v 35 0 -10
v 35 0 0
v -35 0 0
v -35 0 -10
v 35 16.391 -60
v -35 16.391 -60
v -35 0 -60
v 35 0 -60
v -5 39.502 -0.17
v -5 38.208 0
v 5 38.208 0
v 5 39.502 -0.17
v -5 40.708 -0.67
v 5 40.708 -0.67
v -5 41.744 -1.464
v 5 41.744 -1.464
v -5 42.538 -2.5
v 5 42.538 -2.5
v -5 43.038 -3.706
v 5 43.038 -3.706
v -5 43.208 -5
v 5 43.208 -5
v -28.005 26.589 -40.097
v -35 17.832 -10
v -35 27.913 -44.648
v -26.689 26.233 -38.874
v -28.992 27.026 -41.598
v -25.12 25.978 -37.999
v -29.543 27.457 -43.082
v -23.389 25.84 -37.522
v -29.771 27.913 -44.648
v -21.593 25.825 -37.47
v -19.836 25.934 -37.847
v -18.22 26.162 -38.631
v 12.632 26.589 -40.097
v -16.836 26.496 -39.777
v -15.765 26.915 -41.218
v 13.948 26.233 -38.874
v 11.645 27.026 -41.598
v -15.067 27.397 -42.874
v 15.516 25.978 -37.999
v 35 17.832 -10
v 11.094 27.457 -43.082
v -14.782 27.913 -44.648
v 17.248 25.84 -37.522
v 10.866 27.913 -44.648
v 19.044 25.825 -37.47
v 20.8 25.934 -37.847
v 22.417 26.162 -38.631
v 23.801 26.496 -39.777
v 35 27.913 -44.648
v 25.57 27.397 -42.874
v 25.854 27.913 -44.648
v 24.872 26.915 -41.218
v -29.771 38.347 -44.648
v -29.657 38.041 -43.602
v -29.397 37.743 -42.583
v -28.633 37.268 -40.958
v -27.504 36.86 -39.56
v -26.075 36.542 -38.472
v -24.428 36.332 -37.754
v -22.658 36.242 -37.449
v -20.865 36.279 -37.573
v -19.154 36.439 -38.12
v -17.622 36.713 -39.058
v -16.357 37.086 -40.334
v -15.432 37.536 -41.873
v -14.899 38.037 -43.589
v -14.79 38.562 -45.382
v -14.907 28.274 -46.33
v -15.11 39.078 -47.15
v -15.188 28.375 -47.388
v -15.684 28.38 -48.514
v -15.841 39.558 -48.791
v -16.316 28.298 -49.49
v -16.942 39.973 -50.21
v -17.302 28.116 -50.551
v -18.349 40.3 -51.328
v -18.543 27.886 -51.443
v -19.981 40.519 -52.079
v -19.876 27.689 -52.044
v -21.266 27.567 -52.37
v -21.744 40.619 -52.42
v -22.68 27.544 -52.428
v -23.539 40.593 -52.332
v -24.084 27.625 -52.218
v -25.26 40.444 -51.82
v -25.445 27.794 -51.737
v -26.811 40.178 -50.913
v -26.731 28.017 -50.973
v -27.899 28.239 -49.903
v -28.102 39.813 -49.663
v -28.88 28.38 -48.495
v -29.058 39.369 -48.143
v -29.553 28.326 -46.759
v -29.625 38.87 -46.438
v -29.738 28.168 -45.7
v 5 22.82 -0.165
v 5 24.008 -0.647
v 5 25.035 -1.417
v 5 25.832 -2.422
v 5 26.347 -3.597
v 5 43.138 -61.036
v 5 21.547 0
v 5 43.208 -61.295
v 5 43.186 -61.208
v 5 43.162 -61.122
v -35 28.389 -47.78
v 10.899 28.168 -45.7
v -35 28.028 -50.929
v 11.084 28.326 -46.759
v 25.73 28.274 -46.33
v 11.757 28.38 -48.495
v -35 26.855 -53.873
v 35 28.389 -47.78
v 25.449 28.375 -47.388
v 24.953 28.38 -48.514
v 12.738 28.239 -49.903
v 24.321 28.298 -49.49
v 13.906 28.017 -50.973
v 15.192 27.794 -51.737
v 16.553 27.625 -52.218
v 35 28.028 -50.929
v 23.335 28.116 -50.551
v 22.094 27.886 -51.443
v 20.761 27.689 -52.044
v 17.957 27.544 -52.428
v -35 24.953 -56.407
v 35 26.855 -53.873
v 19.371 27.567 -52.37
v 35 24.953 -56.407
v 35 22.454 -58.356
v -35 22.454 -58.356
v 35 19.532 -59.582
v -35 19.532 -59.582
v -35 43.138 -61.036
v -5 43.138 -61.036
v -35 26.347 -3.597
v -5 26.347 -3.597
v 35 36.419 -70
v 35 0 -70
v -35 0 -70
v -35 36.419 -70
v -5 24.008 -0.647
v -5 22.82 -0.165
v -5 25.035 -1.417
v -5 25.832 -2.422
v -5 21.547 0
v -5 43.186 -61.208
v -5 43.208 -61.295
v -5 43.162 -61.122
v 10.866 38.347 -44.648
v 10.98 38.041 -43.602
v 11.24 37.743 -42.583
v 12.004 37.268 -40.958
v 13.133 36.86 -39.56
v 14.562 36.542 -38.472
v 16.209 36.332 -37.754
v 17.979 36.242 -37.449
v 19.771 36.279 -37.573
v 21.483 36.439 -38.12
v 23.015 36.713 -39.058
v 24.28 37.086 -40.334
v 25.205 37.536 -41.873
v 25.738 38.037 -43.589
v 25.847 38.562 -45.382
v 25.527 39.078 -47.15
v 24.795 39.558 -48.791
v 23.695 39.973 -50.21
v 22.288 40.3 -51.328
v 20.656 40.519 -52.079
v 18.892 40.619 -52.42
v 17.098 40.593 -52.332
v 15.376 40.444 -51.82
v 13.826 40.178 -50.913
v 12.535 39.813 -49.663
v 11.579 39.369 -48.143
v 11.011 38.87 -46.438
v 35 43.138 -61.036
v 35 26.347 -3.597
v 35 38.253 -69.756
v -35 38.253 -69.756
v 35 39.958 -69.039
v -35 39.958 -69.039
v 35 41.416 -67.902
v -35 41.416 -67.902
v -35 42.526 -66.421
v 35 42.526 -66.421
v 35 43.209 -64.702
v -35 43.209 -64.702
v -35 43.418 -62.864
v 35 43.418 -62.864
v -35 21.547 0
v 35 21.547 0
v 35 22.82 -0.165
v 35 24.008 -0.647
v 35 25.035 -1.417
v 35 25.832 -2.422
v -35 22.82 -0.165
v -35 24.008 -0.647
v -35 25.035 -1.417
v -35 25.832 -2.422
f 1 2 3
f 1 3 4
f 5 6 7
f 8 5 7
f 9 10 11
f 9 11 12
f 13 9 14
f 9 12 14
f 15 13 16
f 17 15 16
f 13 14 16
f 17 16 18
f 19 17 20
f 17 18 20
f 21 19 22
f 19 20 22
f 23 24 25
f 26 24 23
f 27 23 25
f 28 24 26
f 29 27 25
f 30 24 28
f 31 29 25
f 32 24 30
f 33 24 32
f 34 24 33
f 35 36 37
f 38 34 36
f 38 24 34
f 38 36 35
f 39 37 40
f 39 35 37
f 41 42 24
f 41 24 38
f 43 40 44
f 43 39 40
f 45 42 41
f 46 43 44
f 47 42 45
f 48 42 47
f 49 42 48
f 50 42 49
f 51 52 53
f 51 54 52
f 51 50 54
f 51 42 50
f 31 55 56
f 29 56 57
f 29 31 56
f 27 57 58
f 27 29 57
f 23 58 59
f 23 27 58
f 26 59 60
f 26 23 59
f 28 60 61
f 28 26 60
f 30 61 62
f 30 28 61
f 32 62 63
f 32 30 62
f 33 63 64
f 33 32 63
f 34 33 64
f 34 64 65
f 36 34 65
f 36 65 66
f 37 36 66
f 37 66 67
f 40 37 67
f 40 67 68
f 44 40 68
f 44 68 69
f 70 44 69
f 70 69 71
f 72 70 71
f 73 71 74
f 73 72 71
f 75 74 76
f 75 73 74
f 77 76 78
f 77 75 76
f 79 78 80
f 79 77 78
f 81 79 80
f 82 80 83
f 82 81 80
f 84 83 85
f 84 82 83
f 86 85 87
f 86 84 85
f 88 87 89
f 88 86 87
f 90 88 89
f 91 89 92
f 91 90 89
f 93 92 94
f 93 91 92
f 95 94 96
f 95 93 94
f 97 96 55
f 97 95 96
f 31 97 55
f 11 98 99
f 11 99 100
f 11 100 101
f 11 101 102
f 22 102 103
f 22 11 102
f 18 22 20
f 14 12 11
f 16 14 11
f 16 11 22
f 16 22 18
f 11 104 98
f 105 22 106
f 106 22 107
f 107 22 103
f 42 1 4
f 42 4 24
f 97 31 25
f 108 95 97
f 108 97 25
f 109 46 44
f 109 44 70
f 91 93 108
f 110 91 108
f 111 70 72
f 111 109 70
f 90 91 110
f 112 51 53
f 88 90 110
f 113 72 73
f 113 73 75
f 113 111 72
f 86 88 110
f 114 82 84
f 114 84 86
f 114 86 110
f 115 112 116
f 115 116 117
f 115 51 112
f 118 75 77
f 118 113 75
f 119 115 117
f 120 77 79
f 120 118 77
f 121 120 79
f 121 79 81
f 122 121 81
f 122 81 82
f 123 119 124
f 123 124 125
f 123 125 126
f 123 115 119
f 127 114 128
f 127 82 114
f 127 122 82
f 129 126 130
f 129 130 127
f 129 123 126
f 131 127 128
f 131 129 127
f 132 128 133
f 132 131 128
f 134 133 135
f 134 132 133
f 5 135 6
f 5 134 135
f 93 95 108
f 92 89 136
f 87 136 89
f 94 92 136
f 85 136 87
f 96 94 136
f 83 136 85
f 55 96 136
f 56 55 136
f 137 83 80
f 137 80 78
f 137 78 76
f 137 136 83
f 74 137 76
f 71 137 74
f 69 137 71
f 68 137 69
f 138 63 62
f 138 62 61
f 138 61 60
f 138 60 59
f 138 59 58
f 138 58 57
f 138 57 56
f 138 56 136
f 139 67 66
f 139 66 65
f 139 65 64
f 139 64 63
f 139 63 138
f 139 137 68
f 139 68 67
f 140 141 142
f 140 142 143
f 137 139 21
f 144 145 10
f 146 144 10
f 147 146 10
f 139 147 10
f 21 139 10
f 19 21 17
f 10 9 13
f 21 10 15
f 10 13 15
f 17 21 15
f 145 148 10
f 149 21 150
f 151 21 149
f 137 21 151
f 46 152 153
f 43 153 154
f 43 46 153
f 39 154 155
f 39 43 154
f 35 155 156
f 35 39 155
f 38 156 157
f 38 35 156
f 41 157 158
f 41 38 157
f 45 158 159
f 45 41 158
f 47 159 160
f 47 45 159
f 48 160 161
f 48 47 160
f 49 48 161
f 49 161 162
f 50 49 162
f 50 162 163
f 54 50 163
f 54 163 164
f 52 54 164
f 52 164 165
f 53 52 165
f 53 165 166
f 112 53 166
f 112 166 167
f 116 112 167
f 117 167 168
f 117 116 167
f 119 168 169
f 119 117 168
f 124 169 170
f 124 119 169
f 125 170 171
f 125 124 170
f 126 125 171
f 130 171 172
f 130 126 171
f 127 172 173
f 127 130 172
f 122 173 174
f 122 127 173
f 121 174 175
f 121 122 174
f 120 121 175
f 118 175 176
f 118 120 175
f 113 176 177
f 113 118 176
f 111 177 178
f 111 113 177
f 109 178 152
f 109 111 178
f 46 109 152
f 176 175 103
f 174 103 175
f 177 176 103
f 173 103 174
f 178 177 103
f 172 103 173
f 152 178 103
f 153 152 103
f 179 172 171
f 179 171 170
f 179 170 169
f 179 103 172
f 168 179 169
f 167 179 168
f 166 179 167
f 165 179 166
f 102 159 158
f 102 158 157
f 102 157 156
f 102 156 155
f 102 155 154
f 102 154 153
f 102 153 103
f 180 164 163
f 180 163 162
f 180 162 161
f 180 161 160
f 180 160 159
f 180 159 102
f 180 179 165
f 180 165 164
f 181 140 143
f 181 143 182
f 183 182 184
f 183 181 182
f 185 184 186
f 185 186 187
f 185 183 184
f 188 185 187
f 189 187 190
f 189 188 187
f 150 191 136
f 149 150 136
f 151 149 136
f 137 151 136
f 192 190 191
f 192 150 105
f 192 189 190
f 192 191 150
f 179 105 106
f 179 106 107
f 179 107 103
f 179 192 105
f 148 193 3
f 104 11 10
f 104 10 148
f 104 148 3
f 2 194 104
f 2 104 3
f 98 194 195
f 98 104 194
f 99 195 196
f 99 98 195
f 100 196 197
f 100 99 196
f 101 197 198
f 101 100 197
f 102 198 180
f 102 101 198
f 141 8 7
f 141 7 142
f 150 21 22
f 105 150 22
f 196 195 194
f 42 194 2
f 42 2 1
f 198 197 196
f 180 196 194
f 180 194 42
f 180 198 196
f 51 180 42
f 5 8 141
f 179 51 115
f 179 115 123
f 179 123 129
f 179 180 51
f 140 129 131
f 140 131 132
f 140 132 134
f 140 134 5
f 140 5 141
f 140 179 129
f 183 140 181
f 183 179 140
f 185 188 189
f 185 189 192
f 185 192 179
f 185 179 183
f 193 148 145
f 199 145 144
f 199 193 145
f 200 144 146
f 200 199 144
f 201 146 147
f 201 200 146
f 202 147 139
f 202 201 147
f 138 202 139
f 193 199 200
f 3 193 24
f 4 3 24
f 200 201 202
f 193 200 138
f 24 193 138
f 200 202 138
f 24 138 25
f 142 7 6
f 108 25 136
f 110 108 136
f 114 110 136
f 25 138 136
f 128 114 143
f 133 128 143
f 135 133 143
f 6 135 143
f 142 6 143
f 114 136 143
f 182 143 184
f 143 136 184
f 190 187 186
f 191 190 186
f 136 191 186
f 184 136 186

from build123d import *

# Parameters (mm, degrees)
BOSS_EXTRUDE1_DEPTH = 35
BOSS_EXTRUDE2_REACH = 91.5
SKETCH4_W           = 9.999142244
SKETCH4_H           = 17.913024492
CUT_EXTRUDE1_REACH  = 91.5
SKETCH6_R           = 7.5
FILLET2_R           = 5


with BuildPart() as part:
    # Sketch2 → Boss-Extrude1 (new, symmetric)
    with BuildSketch(Plane(origin=(0, 0, 0), x_dir=(0, 0, -1), z_dir=(1, 0, 0))):
        with BuildLine():
            Line((0, 25.295092448), (0, 0))
            Line((0, 0), (10, 0))
            Line((10, 0), (10, 17.831828992))
            Line((10, 17.831828992), (44.647504272, 27.912868223))
            ThreePointArc((44.647504272, 27.912868223), (55.203126101, 25.988336757), (60, 16.390682129))
            Line((60, 16.390682129), (60, 0))
            Line((60, 0), (70, 0))
            Line((70, 0), (70, 36.418950493))
            ThreePointArc((70, 36.418950493), (67.19828686, 42.020234938), (61.035889303, 43.137750175))
            Line((61.035889303, 43.137750175), (0, 25.295092448))
        make_face()
    extrude(amount=BOSS_EXTRUDE1_DEPTH, both=True)

    # Sketch4 → Boss-Extrude2 (add, up to next)
    with BuildSketch(Plane.XY, mode=Mode.PRIVATE) as boss_extrude2_sk1:
        with Locations((0, 34.251604694)):
            Rectangle(SKETCH4_W, SKETCH4_H)
    boss_extrude2_tool1 = extrude(boss_extrude2_sk1.sketch, amount=-BOSS_EXTRUDE2_REACH, mode=Mode.PRIVATE) - part.part
    add(boss_extrude2_tool1.solids().sort_by_distance((0, 34.251605, 0))[0])

    # Cut-Extrude1: up to this plane
    cut_extrude1_end = Plane(origin=(35, 43.137750175, -61.035889303), z_dir=(0, -0.9598285260414122, -0.280587242399169))
    # Sketch6 → Cut-Extrude1 (cut, up to the surface)
    with BuildSketch(Plane(origin=(0, 0, 0), x_dir=(1, 0, 0), z_dir=(0, 1, 0)), mode=Mode.PRIVATE) as cut_extrude1_sk1:
        with Locations(Location((18.359997259, 44.938878516, 0), (0, 0, 182.226493381))):
            Circle(SKETCH6_R)
    cut_extrude1_tool1 = split(extrude(cut_extrude1_sk1.sketch, amount=CUT_EXTRUDE1_REACH, mode=Mode.PRIVATE), bisect_by=cut_extrude1_end, keep=Keep.BOTH, mode=Mode.PRIVATE)
    add(cut_extrude1_tool1.solids().sort_by_distance((18.359997, 0, -44.938879))[0], mode=Mode.SUBTRACT)
    # Sketch6 → Cut-Extrude1 (cut, up to the surface)
    with BuildSketch(Plane(origin=(0, 0, 0), x_dir=(1, 0, 0), z_dir=(0, 1, 0)), mode=Mode.PRIVATE) as cut_extrude1_sk2:
        with Locations(Location((-22.276796675, 44.938878516, 0), (0, 0, 182.226493381))):
            Circle(SKETCH6_R)
    cut_extrude1_tool2 = split(extrude(cut_extrude1_sk2.sketch, amount=CUT_EXTRUDE1_REACH, mode=Mode.PRIVATE), bisect_by=cut_extrude1_end, keep=Keep.BOTH, mode=Mode.PRIVATE)
    add(cut_extrude1_tool2.solids().sort_by_distance((-22.276797, 0, -44.938879))[0], mode=Mode.SUBTRACT)

    # Fillet2
    fillet2_edges = [part.edges().sort_by_distance(p)[0] for p in [
        (19.999785561, 25.295092448, 0),
        (-19.999785561, 25.295092448, 0),
        (0, 43.20811694, 0),
    ]]
    fillet(fillet2_edges, radius=FILLET2_R)


solid = part.part
